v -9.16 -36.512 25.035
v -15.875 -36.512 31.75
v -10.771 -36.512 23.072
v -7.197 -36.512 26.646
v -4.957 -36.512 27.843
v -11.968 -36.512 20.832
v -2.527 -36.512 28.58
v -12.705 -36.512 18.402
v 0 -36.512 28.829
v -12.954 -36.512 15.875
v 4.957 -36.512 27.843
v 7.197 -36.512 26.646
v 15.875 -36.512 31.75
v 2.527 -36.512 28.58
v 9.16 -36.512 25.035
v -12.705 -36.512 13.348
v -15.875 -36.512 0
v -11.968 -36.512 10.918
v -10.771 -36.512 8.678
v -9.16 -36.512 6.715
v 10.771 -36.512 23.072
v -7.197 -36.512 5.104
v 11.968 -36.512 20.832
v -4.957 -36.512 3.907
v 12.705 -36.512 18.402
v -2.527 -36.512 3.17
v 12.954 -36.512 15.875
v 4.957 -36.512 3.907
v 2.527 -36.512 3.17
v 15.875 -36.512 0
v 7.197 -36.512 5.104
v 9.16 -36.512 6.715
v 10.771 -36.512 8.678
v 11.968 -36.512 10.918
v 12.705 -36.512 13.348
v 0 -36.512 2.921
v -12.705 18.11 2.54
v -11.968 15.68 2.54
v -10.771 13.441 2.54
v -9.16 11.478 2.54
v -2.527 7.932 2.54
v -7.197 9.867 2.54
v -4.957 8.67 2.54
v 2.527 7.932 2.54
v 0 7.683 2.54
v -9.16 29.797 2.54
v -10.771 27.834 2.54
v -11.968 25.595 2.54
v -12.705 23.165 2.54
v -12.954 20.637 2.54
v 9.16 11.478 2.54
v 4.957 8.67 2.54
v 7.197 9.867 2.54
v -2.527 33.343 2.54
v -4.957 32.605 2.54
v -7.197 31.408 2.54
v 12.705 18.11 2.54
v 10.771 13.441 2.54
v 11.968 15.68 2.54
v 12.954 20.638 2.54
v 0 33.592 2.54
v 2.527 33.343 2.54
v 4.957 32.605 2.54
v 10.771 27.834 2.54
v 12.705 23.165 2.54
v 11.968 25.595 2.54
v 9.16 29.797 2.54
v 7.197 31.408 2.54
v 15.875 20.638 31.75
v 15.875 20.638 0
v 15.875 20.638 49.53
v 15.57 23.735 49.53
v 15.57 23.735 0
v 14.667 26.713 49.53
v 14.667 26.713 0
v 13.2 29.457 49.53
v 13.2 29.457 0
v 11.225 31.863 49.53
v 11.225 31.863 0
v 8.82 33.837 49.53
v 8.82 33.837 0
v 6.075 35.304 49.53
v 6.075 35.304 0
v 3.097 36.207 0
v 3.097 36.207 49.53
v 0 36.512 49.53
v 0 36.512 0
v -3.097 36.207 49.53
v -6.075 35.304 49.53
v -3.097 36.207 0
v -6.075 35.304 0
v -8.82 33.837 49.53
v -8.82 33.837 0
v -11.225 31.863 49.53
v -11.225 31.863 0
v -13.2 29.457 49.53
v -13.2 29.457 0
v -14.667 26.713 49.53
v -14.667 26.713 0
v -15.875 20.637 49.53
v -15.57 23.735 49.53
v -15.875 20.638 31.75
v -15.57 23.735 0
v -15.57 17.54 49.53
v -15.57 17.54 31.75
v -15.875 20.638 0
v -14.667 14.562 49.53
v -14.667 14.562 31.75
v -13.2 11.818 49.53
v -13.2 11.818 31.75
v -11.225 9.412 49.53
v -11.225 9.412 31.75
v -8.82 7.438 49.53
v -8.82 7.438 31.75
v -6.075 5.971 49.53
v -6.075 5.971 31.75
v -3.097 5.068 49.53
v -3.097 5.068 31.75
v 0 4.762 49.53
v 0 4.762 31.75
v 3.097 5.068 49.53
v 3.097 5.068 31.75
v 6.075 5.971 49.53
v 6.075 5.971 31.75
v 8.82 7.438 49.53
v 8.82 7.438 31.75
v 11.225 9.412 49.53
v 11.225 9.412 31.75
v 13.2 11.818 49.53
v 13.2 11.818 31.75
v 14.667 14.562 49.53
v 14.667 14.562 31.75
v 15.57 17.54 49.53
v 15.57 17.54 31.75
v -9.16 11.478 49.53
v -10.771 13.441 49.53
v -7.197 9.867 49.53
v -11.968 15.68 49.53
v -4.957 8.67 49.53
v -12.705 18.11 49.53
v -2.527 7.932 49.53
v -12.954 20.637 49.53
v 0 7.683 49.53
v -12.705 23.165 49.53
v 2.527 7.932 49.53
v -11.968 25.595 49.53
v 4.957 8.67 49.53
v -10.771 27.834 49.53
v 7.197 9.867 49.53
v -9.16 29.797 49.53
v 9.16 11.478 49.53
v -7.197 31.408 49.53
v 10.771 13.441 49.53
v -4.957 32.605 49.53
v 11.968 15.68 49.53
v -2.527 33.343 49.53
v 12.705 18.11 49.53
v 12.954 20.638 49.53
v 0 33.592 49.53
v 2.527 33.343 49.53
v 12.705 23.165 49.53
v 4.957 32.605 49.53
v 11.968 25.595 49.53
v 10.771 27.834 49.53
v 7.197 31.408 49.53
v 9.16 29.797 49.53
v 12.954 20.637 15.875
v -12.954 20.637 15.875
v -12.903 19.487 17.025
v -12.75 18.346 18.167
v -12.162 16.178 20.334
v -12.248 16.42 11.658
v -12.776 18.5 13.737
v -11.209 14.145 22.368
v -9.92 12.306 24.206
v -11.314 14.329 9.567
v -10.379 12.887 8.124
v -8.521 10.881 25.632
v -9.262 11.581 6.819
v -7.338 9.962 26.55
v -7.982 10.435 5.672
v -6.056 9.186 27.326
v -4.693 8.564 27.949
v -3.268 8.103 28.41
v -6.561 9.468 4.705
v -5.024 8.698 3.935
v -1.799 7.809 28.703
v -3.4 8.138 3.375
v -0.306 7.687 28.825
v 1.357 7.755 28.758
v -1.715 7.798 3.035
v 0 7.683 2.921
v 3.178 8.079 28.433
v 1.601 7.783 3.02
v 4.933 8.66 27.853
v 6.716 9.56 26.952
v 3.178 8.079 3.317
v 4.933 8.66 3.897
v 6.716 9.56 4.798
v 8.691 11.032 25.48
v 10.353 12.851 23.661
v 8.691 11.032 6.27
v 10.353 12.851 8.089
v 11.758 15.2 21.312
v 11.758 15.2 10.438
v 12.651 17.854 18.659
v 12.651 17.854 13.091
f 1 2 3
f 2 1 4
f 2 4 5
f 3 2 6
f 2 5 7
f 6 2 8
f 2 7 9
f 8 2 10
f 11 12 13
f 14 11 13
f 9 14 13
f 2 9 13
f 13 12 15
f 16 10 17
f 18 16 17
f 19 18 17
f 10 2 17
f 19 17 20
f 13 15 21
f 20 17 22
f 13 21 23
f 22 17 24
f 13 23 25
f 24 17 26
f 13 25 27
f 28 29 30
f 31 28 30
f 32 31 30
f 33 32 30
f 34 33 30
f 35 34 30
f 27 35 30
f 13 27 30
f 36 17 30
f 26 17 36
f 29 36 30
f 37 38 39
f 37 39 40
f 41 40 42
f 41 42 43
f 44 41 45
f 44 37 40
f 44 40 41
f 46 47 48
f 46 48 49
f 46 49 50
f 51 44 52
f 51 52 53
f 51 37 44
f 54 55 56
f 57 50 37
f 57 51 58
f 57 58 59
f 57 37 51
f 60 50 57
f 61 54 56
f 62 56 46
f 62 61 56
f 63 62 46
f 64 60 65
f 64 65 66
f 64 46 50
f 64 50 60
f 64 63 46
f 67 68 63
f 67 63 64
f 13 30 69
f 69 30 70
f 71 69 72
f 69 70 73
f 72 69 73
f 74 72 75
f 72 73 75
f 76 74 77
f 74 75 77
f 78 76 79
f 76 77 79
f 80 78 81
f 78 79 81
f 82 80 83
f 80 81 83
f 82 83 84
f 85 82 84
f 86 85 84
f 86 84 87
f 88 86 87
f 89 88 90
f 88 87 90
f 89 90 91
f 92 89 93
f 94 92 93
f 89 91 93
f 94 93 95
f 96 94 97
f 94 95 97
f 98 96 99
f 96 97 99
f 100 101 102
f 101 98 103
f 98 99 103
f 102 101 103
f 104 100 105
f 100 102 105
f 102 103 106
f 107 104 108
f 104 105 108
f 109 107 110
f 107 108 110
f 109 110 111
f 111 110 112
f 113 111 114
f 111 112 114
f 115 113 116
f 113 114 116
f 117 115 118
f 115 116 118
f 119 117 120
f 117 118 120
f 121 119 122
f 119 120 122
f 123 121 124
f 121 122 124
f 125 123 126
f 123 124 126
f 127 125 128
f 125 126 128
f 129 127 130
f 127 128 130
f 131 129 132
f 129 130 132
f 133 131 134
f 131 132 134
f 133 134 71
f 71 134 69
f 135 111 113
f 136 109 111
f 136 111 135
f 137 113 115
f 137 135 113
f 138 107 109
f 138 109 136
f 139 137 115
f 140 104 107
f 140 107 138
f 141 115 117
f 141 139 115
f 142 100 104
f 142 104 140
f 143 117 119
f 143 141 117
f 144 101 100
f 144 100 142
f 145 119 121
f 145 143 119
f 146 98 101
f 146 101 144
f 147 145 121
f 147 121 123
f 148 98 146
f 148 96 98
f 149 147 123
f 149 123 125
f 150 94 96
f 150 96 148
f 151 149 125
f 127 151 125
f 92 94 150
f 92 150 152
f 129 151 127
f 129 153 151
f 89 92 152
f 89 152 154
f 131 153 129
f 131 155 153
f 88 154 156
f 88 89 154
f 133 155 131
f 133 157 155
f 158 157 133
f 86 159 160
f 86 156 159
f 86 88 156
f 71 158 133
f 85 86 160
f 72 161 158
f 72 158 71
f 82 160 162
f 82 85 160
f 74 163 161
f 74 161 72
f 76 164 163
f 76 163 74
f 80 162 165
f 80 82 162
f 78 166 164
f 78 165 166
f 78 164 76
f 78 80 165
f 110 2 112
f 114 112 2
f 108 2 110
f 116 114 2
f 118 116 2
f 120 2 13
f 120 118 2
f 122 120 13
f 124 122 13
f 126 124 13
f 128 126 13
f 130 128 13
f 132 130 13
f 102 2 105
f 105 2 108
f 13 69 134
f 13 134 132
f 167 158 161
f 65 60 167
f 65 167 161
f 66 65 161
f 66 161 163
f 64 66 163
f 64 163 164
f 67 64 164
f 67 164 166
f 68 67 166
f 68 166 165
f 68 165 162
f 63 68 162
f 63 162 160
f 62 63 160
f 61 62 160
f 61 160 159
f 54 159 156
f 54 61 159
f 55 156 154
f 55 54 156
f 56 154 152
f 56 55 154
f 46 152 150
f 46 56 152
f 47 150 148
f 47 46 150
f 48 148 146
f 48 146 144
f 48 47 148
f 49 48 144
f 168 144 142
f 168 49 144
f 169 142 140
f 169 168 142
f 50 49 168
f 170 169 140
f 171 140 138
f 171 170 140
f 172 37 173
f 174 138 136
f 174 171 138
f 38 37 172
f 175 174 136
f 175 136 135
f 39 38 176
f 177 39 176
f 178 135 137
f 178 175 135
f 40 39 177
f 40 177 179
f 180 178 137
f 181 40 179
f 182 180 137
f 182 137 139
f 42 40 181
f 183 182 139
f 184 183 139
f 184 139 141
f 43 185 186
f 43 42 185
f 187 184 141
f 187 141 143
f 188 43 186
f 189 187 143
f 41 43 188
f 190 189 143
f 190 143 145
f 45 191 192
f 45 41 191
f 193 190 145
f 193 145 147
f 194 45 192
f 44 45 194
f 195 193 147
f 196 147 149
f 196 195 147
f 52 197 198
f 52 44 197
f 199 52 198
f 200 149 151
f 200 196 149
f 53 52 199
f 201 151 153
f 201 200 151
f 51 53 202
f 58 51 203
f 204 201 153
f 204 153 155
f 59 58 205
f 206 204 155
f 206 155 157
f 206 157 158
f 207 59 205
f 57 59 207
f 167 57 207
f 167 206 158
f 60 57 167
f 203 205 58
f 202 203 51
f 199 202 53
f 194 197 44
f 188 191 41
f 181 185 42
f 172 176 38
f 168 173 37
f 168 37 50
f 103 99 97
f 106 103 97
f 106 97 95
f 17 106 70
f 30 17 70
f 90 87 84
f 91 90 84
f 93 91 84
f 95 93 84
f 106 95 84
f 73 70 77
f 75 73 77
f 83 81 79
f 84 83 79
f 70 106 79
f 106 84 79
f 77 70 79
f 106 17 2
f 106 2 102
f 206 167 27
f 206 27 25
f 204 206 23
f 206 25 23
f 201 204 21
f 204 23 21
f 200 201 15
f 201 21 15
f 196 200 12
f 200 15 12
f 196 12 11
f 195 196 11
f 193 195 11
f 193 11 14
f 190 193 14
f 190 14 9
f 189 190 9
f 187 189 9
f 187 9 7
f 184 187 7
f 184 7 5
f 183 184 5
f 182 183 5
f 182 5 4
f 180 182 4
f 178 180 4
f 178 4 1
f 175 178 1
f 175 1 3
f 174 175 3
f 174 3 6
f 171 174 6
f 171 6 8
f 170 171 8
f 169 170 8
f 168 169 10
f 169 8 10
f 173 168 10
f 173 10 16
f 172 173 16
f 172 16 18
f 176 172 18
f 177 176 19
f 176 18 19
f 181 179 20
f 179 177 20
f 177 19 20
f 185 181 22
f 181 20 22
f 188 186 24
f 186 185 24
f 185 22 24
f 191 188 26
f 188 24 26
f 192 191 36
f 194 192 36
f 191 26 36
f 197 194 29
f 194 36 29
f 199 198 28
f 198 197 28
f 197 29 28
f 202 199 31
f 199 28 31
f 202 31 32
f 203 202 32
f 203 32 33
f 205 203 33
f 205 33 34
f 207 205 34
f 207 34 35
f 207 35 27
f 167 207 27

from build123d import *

# Parameters (mm, degrees)
F0_W     = 31.75
F0_H     = 73.025
F1_DEPTH = 31.75
F2_R     = 15.875
F2_R_2   = 12.954
F3_DEPTH = 17.78
F4_DEPTH = 31.751
F5_DEPTH = 31.751
F6_DEPTH = 29.21
F7_R     = 12.954
F8_DEPTH = 57.15


with BuildPart() as f1:
    # F0 (on Top) → F1 (new body)
    with BuildSketch(Plane.XY):
        Rectangle(F0_W, F0_H)
    extrude(amount=F1_DEPTH)

    # F2 (on face) → F3 (join)
    with BuildSketch(Plane.XY.offset(31.75)):
        with Locations((0, 20.6375)):
            Circle(F2_R)
        with Locations((0, 20.6375)):
            Circle(F2_R_2, mode=Mode.SUBTRACT)
    extrude(amount=F3_DEPTH)

    # F4 (cut, through all): a face of the model
    f4_faces = [f1.faces().sort_by_distance(p)[0] for p in [
        (-12.3290339692, 32.9665339692, 31.75),
    ]]
    extrude(f4_faces, amount=-F4_DEPTH, mode=Mode.SUBTRACT)

    # F5 (cut, through all): a face of the model
    f5_faces = [f1.faces().sort_by_distance(p)[0] for p in [
        (12.3290339692, 32.9665339692, 31.75),
    ]]
    extrude(f5_faces, amount=-F5_DEPTH, mode=Mode.SUBTRACT)

    # F6 (cut): a face of the model
    f6_faces = [f1.faces().sort_by_distance(p)[0] for p in [
        (0, 20.6375, 31.75),
    ]]
    extrude(f6_faces, amount=-F6_DEPTH, mode=Mode.SUBTRACT)

    # F7 (on face) → F8 (cut)
    with BuildSketch(Plane.XZ.offset(36.5125)):
        with Locations((0, 15.875)):
            Circle(F7_R)
    extrude(amount=-F8_DEPTH, mode=Mode.SUBTRACT)


solid = f1.part
